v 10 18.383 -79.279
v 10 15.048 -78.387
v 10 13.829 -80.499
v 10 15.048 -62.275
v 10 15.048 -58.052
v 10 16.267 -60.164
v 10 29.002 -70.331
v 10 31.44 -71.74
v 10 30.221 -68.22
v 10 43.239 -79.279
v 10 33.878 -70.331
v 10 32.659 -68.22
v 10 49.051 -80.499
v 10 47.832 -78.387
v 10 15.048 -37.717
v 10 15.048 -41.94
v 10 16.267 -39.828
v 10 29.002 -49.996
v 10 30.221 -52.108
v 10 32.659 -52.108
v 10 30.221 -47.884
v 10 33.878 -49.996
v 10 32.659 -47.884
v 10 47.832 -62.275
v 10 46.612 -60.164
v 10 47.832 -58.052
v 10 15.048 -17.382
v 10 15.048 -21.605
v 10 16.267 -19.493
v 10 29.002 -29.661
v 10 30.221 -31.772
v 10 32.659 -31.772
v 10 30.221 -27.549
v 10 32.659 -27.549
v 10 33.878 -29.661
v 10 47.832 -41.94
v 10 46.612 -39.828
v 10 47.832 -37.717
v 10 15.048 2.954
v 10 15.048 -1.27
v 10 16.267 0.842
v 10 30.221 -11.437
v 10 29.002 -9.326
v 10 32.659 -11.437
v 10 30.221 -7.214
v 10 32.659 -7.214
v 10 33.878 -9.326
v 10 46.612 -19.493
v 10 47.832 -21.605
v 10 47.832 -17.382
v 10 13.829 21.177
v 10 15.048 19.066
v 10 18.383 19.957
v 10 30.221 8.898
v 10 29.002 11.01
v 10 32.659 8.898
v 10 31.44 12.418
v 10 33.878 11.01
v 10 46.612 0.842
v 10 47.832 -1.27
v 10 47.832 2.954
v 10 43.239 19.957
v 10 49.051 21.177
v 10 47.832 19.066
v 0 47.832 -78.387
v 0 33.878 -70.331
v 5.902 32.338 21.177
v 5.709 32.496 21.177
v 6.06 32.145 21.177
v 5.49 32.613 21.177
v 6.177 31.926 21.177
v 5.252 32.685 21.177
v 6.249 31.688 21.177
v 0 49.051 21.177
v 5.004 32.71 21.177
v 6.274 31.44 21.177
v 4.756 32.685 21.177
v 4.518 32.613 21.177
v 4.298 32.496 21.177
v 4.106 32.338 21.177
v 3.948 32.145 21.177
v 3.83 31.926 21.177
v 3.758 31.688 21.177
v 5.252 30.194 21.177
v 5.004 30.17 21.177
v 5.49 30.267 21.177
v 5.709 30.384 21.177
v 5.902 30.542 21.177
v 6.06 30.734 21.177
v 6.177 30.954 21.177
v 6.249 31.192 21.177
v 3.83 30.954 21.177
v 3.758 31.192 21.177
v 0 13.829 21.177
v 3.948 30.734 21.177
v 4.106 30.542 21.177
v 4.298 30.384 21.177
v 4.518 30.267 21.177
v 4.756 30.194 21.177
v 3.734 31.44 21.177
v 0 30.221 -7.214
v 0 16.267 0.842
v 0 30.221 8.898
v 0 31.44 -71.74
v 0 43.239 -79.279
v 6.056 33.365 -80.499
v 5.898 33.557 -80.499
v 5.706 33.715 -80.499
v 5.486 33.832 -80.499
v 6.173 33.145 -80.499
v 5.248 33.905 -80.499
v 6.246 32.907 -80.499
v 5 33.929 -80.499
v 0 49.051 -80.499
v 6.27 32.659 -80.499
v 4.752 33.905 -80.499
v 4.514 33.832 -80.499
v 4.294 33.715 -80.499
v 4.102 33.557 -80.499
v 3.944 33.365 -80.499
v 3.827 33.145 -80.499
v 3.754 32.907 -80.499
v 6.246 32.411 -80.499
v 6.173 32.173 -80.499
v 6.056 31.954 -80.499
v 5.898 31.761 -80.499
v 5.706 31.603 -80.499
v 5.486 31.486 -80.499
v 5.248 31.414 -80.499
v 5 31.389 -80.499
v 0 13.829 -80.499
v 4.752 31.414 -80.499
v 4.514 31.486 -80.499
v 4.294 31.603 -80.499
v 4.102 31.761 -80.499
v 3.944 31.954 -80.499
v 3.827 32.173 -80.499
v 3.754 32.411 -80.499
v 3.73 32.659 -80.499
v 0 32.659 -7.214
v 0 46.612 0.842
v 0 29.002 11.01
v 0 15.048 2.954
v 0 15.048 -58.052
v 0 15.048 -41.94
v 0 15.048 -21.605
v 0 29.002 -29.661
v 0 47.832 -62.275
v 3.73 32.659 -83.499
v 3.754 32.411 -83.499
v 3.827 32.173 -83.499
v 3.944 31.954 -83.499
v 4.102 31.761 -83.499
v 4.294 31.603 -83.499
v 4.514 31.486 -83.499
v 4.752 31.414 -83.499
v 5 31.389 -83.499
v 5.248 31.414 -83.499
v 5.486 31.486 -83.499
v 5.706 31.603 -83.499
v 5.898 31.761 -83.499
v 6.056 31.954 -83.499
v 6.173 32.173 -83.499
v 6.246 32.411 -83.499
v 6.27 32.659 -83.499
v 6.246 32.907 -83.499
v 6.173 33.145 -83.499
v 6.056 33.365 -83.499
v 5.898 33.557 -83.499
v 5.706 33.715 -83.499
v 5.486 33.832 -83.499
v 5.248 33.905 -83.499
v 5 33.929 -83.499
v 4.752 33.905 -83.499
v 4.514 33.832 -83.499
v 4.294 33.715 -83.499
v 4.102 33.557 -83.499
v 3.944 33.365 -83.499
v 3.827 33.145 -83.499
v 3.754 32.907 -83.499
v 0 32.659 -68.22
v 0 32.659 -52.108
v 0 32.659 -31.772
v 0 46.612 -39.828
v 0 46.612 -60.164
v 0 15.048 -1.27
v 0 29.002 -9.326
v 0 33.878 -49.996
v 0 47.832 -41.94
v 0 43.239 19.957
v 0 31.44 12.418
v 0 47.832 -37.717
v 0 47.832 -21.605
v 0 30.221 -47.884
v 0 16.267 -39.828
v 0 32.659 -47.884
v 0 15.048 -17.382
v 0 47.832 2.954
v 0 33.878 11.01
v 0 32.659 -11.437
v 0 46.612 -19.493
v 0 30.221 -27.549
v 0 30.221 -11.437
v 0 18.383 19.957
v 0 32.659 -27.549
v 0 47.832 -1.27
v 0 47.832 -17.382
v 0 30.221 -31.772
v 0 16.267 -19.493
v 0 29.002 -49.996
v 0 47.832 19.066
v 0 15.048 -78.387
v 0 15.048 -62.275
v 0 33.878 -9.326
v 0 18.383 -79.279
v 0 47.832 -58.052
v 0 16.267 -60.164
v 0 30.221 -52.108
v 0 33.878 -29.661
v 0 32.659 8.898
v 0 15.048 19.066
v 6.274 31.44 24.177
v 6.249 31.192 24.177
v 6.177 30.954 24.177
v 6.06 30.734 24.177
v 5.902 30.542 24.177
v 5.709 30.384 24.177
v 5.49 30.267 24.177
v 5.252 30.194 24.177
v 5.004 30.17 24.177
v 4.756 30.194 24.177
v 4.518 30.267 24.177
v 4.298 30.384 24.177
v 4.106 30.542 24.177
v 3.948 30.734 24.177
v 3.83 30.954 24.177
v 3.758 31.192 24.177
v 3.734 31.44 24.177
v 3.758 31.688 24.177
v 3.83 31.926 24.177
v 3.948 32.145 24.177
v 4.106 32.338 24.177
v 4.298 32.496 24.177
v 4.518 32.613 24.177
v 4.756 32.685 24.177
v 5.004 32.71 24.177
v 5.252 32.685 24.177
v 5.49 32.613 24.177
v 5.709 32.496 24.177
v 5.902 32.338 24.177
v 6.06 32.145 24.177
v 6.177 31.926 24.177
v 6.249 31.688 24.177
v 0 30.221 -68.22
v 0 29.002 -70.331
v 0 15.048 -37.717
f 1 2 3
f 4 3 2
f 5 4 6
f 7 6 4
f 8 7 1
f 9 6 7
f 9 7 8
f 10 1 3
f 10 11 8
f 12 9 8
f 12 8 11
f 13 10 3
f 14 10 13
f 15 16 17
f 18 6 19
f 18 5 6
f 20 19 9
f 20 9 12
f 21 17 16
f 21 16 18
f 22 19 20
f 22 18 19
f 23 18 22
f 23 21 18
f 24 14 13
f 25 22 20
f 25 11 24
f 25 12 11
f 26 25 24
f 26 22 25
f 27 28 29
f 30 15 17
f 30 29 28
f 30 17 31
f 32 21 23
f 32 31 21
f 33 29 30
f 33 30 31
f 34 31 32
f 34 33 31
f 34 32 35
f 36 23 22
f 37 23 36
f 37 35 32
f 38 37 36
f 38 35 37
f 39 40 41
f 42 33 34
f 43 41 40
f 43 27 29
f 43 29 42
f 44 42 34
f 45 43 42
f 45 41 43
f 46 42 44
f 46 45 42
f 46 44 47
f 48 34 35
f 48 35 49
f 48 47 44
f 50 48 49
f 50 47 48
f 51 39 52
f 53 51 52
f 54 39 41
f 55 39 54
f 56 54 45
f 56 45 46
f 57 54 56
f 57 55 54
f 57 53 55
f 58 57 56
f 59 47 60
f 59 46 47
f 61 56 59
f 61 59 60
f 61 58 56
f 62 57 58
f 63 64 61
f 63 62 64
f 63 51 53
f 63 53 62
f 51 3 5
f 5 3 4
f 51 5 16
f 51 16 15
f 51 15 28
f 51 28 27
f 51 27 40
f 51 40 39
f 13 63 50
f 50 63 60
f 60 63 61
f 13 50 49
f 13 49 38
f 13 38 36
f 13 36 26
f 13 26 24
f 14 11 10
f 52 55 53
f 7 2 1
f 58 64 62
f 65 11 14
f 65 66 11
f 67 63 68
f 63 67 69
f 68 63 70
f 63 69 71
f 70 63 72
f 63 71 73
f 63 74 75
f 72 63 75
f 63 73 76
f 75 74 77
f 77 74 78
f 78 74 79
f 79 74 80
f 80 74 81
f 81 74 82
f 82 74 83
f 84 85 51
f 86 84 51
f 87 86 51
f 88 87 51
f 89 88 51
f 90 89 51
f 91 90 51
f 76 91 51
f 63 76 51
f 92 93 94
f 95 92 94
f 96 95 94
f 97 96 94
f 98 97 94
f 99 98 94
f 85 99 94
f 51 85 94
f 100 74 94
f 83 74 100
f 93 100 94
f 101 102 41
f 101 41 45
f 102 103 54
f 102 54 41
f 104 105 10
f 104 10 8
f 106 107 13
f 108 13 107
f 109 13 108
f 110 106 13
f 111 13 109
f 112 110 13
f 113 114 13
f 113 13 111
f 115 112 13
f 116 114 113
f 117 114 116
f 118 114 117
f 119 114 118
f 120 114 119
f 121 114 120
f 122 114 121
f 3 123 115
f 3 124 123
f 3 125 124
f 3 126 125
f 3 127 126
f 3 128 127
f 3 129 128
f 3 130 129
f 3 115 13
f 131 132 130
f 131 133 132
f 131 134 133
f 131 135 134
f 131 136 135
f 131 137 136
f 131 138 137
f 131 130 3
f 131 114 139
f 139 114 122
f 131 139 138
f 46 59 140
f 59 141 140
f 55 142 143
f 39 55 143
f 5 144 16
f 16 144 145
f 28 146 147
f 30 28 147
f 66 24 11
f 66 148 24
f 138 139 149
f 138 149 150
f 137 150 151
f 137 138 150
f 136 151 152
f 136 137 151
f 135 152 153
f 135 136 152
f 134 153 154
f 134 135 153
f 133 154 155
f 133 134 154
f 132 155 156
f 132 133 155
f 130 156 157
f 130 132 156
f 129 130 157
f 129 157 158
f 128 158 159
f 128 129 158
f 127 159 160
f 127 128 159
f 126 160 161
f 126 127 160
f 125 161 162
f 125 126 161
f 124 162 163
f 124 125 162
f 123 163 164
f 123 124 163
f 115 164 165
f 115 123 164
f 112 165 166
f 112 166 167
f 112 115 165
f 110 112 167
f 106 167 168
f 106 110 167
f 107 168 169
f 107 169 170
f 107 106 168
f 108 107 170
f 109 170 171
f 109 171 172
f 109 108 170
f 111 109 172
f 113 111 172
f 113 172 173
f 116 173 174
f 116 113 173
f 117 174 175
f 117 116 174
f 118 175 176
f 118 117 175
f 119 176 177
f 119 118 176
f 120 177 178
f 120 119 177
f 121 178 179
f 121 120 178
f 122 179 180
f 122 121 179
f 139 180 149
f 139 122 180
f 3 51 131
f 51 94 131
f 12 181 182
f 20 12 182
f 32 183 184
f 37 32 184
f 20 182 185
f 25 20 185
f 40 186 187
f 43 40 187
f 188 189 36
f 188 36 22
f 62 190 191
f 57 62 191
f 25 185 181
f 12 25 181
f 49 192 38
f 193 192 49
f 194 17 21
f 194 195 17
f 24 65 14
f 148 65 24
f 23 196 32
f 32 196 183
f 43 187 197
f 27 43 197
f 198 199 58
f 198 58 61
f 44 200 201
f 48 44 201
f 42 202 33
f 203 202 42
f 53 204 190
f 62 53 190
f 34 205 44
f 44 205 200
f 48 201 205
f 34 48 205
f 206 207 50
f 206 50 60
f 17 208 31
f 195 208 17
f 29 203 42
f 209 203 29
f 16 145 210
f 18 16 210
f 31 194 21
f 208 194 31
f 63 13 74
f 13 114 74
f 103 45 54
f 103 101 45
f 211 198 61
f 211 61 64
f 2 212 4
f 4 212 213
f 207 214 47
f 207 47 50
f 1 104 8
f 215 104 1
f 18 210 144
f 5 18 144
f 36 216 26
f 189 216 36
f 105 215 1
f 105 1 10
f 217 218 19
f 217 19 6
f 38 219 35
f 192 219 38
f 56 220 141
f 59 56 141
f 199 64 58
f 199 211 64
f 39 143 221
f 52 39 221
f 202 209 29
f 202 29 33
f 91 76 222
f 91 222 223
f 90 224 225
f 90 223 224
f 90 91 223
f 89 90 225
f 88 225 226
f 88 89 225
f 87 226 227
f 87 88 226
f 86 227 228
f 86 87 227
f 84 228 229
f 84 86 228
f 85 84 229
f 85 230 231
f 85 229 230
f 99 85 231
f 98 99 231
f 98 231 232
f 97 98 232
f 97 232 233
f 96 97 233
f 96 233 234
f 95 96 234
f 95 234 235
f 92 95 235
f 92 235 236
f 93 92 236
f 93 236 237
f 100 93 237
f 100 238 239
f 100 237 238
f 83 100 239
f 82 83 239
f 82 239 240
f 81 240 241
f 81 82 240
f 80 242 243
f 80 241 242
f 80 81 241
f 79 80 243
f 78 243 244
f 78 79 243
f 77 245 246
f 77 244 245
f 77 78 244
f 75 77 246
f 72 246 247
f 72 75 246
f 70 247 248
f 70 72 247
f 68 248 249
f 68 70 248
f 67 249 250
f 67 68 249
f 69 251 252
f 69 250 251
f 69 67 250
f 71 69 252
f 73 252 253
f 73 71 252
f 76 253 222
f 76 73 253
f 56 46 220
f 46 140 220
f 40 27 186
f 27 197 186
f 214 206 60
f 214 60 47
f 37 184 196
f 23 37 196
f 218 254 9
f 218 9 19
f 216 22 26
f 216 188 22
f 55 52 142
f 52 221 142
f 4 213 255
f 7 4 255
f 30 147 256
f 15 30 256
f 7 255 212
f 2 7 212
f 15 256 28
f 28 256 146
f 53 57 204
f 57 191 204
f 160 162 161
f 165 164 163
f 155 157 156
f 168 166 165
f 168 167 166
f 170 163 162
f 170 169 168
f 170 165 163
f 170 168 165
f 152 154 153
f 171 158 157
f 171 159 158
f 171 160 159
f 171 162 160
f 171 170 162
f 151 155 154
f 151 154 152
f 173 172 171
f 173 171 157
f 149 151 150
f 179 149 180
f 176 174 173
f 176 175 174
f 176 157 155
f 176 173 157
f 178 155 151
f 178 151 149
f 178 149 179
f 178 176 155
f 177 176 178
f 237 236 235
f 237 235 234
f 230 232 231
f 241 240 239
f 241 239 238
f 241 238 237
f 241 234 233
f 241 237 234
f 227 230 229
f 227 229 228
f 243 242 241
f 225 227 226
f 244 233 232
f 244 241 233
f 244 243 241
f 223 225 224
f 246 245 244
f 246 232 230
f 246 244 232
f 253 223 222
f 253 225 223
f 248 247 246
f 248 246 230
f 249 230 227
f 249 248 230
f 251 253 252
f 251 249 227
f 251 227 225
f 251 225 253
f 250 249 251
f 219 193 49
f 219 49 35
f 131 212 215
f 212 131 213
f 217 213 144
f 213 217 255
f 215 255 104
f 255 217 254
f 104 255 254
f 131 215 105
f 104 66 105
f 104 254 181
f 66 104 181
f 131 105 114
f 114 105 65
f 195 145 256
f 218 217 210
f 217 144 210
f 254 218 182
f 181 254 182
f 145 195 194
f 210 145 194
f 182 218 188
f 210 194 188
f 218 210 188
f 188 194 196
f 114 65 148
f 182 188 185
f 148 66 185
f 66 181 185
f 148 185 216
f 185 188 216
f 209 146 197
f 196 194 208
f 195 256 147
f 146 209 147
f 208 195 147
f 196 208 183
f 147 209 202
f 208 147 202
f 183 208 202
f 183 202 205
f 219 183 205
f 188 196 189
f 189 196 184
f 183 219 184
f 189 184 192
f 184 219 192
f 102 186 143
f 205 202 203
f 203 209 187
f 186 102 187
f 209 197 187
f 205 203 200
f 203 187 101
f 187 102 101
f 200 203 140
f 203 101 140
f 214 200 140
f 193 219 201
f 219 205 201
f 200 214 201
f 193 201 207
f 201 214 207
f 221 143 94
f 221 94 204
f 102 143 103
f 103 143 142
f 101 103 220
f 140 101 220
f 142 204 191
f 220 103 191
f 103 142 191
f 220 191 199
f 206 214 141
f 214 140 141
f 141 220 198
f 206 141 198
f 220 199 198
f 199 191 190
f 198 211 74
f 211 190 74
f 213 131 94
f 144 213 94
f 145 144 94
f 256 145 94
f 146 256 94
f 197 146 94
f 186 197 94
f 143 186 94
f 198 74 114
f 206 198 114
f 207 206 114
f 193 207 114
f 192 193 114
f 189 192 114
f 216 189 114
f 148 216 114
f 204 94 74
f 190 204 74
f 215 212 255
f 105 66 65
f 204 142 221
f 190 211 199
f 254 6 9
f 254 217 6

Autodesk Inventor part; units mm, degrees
ref_plane "YZ Plane" through (0, 0, 0) normal (1, 0, 0) x (0, 1, 0)
ref_plane "XZ Plane" through (0, 0, 0) normal (0, 1, 0) x (-1, 0, 0)
ref_plane "XY Plane" through (0, 0, 0) normal (0, 0, 1) x (1, 0, 0)
sketch "Sketch1" plane through (0, 0, 0) normal (1, 0, 0) x (0, 1, 0)
  line L0 (31.4399, 11.0097) -> (31.4399, -9.3256)
  line L1 (31.4399, -9.3256) -> (49.0507, 0.842)
  line L2 (49.0507, 0.842) -> (31.4399, 11.0097)
  line L3 (46.6123, 0.842) -> (32.6591, -7.2139)
  line L4 (32.6591, -7.2139) -> (32.6591, 8.8979)
  line L5 (32.6591, 8.8979) -> (46.6123, 0.842)
  line L6 (49.0507, 0.842) -> (31.4399, -9.3256)
  line L7 (49.0507, -19.4932) -> (31.4399, -9.3256)
  line L8 (49.0507, 0.842) -> (49.0507, -19.4932)
  line L9 (47.8315, -1.2697) -> (33.8783, -9.3256)
  line L10 (33.8783, -9.3256) -> (47.8315, -17.3815)
  line L11 (47.8315, -17.3815) -> (47.8315, -1.2697)
  line L12 (31.4399, -9.3256) -> (31.4399, -29.6608)
  line L13 (31.4399, -29.6608) -> (49.0507, -19.4932)
  line L14 (32.6591, -27.5491) -> (32.6591, -11.4373)
  line L15 (32.6591, -11.4373) -> (46.6123, -19.4932)
  line L16 (46.6123, -19.4932) -> (32.6591, -27.5491)
  line L17 (49.0507, -19.4932) -> (49.0507, -39.8284)
  line L18 (49.0507, -39.8284) -> (31.4399, -29.6608)
  line L19 (47.8315, -37.7167) -> (47.8315, -21.6049)
  line L20 (33.8783, -29.6608) -> (47.8315, -37.7167)
  line L21 (47.8315, -21.6049) -> (33.8783, -29.6608)
  line L22 (31.4399, -29.6608) -> (31.4399, -49.9961)
  line L23 (32.6591, -47.8843) -> (32.6591, -31.7725)
  line L24 (31.4399, -49.9961) -> (49.0507, -39.8284)
  line L25 (46.6123, -39.8284) -> (32.6591, -47.8843)
  line L26 (32.6591, -31.7725) -> (46.6123, -39.8284)
  line L27 (49.0507, -39.8284) -> (49.0507, -60.1637)
  line L28 (47.8315, -41.9402) -> (33.8783, -49.9961)
  line L29 (33.8783, -49.9961) -> (47.8315, -58.052)
  line L30 (49.0507, -60.1637) -> (31.4399, -49.9961)
  line L31 (47.8315, -58.052) -> (47.8315, -41.9402)
  line L32 (31.4399, -49.9961) -> (31.4399, -70.3313)
  line L33 (31.4399, -70.3313) -> (49.0507, -60.1637)
  line L34 (46.6123, -60.1637) -> (32.6591, -68.2196)
  line L35 (32.6591, -68.2196) -> (32.6591, -52.1078)
  line L36 (32.6591, -52.1078) -> (46.6123, -60.1637)
  line L37 (31.4399, -9.3256) -> (13.8291, 0.842)
  line L38 (13.8291, 0.842) -> (31.4399, 11.0097)
  line L39 (16.2675, 0.842) -> (30.2207, -7.2139)
  line L40 (30.2207, -7.2139) -> (30.2207, 8.8979)
  line L41 (30.2207, 8.8979) -> (16.2675, 0.842)
  line L42 (31.4399, -9.3256) -> (13.8291, 0.842)
  line L43 (13.8291, -19.4932) -> (31.4399, -9.3256)
  line L44 (13.8291, 0.842) -> (13.8291, -19.4932)
  line L45 (15.0483, -1.2697) -> (29.0015, -9.3256)
  line L46 (29.0015, -9.3256) -> (15.0483, -17.3815)
  line L47 (15.0483, -17.3815) -> (15.0483, -1.2697)
  line L48 (13.8291, -19.4932) -> (31.4399, -9.3256)
  line L49 (31.4399, -29.6608) -> (13.8291, -19.4932)
  line L50 (30.2207, -11.4373) -> (16.2675, -19.4932)
  line L51 (30.2207, -27.5491) -> (30.2207, -11.4373)
  line L52 (16.2675, -19.4932) -> (30.2207, -27.5491)
  line L53 (13.8291, -39.8284) -> (31.4399, -29.6608)
  line L54 (16.2675, -39.8284) -> (30.2207, -47.8843)
  line L55 (30.2207, -47.8843) -> (30.2207, -31.7725)
  line L56 (31.4399, -49.9961) -> (13.8291, -39.8284)
  line L57 (30.2207, -31.7725) -> (16.2675, -39.8284)
  line L58 (31.4399, -29.6608) -> (13.8291, -19.4932)
  line L59 (15.0483, -21.6049) -> (29.0015, -29.6608)
  line L60 (13.8291, -19.4932) -> (13.8291, -39.8284)
  line L61 (15.0483, -37.7167) -> (15.0483, -21.6049)
  line L62 (13.8291, -39.8284) -> (31.4399, -29.6608)
  line L63 (29.0015, -29.6608) -> (15.0483, -37.7167)
  line L64 (13.8291, -60.1637) -> (31.4399, -49.9961)
  line L65 (30.2207, -68.2196) -> (30.2207, -52.1078)
  line L66 (31.4399, -70.3313) -> (13.8291, -60.1637)
  line L67 (30.2207, -52.1078) -> (16.2675, -60.1637)
  line L68 (16.2675, -60.1637) -> (30.2207, -68.2196)
  line L69 (31.4399, -49.9961) -> (13.8291, -39.8284)
  line L70 (13.8291, -39.8284) -> (13.8291, -60.1637)
  line L71 (15.0483, -58.052) -> (15.0483, -41.9402)
  line L72 (15.0483, -41.9402) -> (29.0015, -49.9961)
  line L73 (13.8291, -60.1637) -> (31.4399, -49.9961)
  line L74 (29.0015, -49.9961) -> (15.0483, -58.052)
  line L75 (13.8291, 0.842) -> (13.8291, 21.1773)
  line L76 (13.8291, 21.1773) -> (31.4399, 11.0097)
  line L77 (49.0507, 0.842) -> (49.0507, 21.1773)
  line L78 (49.0507, 21.1773) -> (31.4399, 11.0097)
  line L79 (49.0507, 21.1773) -> (13.8291, 21.1773)
  line L80 (49.0507, -60.1637) -> (49.0507, -80.4989)
  line L81 (49.0507, -80.4989) -> (31.4399, -70.3313)
  line L82 (13.8291, -60.1637) -> (13.8291, -80.4989)
  line L83 (13.8291, -80.4989) -> (31.4399, -70.3313)
  line L84 (49.0507, -80.4989) -> (13.8291, -80.4989)
  line L85 (15.0483, 2.9538) -> (15.0483, 19.0656)
  line L86 (29.0015, 11.0097) -> (15.0483, 2.9538)
  line L87 (15.0483, 19.0656) -> (29.0015, 11.0097)
  line L88 (47.8315, 2.9538) -> (47.8315, 19.0656)
  line L89 (47.8315, 19.0656) -> (33.8783, 11.0097)
  line L90 (33.8783, 11.0097) -> (47.8315, 2.9538)
  line L91 (33.8783, -70.3313) -> (47.8315, -78.3872)
  line L92 (47.8315, -78.3872) -> (47.8315, -62.2754)
  line L93 (47.8315, -62.2754) -> (33.8783, -70.3313)
  line L94 (29.0015, -70.3313) -> (15.0483, -78.3872)
  line L95 (15.0483, -78.3872) -> (15.0483, -62.2754)
  line L96 (15.0483, -62.2754) -> (29.0015, -70.3313)
  line L97 (33.4035, 19.9572) -> (43.2391, 19.9572)
  line L98 (43.2391, 19.9572) -> (31.4399, 12.4185)
  line L99 (31.4399, 12.4185) -> (18.3826, 19.9572)
  line L100 (18.3826, 19.9572) -> (33.4035, 19.9572)
  line L101 (33.4035, -79.2788) -> (43.2391, -79.2788)
  line L102 (43.2391, -79.2788) -> (31.4399, -71.7402)
  line L103 (31.4399, -71.7402) -> (18.3826, -79.2788)
  line L104 (18.3826, -79.2788) -> (33.4035, -79.2788)
  dimension "d13" = 1.2192
extrude "Extrusion1" add sketch "Sketch1" along normal blind 10
sketch "Sketch2" plane through (0, 13.8291, 21.1773) normal (0, 0, 1) x (1, 0, 0)
  line L0 (0, 35.2217) -> (10, 35.2217) projected
  circle A0 centre (5.0038, 17.6108) radius 1.27
  point P0 (0, -13.8291)
  point P1 (0, 17.6108)
extrude "Extrusion2" add sketch "Sketch2" along normal blind 3
sketch "Sketch3" plane through (0, 13.8291, -80.4989) normal (0, 0, -1) x (-1, 0, 0)
  line L0 (0, 35.2217) -> (-10, 35.2217) projected
  line L1 (0, 18.83) -> (-10, 18.83) projected
  circle A0 centre (-5, 18.83) radius 1.27
  point P0 (0, -13.8291)
  dimension "d36" = 2.54
extrude "Extrusion3" add sketch "Sketch3" along normal blind 3
properties part number "Arm support for bottom arms"
